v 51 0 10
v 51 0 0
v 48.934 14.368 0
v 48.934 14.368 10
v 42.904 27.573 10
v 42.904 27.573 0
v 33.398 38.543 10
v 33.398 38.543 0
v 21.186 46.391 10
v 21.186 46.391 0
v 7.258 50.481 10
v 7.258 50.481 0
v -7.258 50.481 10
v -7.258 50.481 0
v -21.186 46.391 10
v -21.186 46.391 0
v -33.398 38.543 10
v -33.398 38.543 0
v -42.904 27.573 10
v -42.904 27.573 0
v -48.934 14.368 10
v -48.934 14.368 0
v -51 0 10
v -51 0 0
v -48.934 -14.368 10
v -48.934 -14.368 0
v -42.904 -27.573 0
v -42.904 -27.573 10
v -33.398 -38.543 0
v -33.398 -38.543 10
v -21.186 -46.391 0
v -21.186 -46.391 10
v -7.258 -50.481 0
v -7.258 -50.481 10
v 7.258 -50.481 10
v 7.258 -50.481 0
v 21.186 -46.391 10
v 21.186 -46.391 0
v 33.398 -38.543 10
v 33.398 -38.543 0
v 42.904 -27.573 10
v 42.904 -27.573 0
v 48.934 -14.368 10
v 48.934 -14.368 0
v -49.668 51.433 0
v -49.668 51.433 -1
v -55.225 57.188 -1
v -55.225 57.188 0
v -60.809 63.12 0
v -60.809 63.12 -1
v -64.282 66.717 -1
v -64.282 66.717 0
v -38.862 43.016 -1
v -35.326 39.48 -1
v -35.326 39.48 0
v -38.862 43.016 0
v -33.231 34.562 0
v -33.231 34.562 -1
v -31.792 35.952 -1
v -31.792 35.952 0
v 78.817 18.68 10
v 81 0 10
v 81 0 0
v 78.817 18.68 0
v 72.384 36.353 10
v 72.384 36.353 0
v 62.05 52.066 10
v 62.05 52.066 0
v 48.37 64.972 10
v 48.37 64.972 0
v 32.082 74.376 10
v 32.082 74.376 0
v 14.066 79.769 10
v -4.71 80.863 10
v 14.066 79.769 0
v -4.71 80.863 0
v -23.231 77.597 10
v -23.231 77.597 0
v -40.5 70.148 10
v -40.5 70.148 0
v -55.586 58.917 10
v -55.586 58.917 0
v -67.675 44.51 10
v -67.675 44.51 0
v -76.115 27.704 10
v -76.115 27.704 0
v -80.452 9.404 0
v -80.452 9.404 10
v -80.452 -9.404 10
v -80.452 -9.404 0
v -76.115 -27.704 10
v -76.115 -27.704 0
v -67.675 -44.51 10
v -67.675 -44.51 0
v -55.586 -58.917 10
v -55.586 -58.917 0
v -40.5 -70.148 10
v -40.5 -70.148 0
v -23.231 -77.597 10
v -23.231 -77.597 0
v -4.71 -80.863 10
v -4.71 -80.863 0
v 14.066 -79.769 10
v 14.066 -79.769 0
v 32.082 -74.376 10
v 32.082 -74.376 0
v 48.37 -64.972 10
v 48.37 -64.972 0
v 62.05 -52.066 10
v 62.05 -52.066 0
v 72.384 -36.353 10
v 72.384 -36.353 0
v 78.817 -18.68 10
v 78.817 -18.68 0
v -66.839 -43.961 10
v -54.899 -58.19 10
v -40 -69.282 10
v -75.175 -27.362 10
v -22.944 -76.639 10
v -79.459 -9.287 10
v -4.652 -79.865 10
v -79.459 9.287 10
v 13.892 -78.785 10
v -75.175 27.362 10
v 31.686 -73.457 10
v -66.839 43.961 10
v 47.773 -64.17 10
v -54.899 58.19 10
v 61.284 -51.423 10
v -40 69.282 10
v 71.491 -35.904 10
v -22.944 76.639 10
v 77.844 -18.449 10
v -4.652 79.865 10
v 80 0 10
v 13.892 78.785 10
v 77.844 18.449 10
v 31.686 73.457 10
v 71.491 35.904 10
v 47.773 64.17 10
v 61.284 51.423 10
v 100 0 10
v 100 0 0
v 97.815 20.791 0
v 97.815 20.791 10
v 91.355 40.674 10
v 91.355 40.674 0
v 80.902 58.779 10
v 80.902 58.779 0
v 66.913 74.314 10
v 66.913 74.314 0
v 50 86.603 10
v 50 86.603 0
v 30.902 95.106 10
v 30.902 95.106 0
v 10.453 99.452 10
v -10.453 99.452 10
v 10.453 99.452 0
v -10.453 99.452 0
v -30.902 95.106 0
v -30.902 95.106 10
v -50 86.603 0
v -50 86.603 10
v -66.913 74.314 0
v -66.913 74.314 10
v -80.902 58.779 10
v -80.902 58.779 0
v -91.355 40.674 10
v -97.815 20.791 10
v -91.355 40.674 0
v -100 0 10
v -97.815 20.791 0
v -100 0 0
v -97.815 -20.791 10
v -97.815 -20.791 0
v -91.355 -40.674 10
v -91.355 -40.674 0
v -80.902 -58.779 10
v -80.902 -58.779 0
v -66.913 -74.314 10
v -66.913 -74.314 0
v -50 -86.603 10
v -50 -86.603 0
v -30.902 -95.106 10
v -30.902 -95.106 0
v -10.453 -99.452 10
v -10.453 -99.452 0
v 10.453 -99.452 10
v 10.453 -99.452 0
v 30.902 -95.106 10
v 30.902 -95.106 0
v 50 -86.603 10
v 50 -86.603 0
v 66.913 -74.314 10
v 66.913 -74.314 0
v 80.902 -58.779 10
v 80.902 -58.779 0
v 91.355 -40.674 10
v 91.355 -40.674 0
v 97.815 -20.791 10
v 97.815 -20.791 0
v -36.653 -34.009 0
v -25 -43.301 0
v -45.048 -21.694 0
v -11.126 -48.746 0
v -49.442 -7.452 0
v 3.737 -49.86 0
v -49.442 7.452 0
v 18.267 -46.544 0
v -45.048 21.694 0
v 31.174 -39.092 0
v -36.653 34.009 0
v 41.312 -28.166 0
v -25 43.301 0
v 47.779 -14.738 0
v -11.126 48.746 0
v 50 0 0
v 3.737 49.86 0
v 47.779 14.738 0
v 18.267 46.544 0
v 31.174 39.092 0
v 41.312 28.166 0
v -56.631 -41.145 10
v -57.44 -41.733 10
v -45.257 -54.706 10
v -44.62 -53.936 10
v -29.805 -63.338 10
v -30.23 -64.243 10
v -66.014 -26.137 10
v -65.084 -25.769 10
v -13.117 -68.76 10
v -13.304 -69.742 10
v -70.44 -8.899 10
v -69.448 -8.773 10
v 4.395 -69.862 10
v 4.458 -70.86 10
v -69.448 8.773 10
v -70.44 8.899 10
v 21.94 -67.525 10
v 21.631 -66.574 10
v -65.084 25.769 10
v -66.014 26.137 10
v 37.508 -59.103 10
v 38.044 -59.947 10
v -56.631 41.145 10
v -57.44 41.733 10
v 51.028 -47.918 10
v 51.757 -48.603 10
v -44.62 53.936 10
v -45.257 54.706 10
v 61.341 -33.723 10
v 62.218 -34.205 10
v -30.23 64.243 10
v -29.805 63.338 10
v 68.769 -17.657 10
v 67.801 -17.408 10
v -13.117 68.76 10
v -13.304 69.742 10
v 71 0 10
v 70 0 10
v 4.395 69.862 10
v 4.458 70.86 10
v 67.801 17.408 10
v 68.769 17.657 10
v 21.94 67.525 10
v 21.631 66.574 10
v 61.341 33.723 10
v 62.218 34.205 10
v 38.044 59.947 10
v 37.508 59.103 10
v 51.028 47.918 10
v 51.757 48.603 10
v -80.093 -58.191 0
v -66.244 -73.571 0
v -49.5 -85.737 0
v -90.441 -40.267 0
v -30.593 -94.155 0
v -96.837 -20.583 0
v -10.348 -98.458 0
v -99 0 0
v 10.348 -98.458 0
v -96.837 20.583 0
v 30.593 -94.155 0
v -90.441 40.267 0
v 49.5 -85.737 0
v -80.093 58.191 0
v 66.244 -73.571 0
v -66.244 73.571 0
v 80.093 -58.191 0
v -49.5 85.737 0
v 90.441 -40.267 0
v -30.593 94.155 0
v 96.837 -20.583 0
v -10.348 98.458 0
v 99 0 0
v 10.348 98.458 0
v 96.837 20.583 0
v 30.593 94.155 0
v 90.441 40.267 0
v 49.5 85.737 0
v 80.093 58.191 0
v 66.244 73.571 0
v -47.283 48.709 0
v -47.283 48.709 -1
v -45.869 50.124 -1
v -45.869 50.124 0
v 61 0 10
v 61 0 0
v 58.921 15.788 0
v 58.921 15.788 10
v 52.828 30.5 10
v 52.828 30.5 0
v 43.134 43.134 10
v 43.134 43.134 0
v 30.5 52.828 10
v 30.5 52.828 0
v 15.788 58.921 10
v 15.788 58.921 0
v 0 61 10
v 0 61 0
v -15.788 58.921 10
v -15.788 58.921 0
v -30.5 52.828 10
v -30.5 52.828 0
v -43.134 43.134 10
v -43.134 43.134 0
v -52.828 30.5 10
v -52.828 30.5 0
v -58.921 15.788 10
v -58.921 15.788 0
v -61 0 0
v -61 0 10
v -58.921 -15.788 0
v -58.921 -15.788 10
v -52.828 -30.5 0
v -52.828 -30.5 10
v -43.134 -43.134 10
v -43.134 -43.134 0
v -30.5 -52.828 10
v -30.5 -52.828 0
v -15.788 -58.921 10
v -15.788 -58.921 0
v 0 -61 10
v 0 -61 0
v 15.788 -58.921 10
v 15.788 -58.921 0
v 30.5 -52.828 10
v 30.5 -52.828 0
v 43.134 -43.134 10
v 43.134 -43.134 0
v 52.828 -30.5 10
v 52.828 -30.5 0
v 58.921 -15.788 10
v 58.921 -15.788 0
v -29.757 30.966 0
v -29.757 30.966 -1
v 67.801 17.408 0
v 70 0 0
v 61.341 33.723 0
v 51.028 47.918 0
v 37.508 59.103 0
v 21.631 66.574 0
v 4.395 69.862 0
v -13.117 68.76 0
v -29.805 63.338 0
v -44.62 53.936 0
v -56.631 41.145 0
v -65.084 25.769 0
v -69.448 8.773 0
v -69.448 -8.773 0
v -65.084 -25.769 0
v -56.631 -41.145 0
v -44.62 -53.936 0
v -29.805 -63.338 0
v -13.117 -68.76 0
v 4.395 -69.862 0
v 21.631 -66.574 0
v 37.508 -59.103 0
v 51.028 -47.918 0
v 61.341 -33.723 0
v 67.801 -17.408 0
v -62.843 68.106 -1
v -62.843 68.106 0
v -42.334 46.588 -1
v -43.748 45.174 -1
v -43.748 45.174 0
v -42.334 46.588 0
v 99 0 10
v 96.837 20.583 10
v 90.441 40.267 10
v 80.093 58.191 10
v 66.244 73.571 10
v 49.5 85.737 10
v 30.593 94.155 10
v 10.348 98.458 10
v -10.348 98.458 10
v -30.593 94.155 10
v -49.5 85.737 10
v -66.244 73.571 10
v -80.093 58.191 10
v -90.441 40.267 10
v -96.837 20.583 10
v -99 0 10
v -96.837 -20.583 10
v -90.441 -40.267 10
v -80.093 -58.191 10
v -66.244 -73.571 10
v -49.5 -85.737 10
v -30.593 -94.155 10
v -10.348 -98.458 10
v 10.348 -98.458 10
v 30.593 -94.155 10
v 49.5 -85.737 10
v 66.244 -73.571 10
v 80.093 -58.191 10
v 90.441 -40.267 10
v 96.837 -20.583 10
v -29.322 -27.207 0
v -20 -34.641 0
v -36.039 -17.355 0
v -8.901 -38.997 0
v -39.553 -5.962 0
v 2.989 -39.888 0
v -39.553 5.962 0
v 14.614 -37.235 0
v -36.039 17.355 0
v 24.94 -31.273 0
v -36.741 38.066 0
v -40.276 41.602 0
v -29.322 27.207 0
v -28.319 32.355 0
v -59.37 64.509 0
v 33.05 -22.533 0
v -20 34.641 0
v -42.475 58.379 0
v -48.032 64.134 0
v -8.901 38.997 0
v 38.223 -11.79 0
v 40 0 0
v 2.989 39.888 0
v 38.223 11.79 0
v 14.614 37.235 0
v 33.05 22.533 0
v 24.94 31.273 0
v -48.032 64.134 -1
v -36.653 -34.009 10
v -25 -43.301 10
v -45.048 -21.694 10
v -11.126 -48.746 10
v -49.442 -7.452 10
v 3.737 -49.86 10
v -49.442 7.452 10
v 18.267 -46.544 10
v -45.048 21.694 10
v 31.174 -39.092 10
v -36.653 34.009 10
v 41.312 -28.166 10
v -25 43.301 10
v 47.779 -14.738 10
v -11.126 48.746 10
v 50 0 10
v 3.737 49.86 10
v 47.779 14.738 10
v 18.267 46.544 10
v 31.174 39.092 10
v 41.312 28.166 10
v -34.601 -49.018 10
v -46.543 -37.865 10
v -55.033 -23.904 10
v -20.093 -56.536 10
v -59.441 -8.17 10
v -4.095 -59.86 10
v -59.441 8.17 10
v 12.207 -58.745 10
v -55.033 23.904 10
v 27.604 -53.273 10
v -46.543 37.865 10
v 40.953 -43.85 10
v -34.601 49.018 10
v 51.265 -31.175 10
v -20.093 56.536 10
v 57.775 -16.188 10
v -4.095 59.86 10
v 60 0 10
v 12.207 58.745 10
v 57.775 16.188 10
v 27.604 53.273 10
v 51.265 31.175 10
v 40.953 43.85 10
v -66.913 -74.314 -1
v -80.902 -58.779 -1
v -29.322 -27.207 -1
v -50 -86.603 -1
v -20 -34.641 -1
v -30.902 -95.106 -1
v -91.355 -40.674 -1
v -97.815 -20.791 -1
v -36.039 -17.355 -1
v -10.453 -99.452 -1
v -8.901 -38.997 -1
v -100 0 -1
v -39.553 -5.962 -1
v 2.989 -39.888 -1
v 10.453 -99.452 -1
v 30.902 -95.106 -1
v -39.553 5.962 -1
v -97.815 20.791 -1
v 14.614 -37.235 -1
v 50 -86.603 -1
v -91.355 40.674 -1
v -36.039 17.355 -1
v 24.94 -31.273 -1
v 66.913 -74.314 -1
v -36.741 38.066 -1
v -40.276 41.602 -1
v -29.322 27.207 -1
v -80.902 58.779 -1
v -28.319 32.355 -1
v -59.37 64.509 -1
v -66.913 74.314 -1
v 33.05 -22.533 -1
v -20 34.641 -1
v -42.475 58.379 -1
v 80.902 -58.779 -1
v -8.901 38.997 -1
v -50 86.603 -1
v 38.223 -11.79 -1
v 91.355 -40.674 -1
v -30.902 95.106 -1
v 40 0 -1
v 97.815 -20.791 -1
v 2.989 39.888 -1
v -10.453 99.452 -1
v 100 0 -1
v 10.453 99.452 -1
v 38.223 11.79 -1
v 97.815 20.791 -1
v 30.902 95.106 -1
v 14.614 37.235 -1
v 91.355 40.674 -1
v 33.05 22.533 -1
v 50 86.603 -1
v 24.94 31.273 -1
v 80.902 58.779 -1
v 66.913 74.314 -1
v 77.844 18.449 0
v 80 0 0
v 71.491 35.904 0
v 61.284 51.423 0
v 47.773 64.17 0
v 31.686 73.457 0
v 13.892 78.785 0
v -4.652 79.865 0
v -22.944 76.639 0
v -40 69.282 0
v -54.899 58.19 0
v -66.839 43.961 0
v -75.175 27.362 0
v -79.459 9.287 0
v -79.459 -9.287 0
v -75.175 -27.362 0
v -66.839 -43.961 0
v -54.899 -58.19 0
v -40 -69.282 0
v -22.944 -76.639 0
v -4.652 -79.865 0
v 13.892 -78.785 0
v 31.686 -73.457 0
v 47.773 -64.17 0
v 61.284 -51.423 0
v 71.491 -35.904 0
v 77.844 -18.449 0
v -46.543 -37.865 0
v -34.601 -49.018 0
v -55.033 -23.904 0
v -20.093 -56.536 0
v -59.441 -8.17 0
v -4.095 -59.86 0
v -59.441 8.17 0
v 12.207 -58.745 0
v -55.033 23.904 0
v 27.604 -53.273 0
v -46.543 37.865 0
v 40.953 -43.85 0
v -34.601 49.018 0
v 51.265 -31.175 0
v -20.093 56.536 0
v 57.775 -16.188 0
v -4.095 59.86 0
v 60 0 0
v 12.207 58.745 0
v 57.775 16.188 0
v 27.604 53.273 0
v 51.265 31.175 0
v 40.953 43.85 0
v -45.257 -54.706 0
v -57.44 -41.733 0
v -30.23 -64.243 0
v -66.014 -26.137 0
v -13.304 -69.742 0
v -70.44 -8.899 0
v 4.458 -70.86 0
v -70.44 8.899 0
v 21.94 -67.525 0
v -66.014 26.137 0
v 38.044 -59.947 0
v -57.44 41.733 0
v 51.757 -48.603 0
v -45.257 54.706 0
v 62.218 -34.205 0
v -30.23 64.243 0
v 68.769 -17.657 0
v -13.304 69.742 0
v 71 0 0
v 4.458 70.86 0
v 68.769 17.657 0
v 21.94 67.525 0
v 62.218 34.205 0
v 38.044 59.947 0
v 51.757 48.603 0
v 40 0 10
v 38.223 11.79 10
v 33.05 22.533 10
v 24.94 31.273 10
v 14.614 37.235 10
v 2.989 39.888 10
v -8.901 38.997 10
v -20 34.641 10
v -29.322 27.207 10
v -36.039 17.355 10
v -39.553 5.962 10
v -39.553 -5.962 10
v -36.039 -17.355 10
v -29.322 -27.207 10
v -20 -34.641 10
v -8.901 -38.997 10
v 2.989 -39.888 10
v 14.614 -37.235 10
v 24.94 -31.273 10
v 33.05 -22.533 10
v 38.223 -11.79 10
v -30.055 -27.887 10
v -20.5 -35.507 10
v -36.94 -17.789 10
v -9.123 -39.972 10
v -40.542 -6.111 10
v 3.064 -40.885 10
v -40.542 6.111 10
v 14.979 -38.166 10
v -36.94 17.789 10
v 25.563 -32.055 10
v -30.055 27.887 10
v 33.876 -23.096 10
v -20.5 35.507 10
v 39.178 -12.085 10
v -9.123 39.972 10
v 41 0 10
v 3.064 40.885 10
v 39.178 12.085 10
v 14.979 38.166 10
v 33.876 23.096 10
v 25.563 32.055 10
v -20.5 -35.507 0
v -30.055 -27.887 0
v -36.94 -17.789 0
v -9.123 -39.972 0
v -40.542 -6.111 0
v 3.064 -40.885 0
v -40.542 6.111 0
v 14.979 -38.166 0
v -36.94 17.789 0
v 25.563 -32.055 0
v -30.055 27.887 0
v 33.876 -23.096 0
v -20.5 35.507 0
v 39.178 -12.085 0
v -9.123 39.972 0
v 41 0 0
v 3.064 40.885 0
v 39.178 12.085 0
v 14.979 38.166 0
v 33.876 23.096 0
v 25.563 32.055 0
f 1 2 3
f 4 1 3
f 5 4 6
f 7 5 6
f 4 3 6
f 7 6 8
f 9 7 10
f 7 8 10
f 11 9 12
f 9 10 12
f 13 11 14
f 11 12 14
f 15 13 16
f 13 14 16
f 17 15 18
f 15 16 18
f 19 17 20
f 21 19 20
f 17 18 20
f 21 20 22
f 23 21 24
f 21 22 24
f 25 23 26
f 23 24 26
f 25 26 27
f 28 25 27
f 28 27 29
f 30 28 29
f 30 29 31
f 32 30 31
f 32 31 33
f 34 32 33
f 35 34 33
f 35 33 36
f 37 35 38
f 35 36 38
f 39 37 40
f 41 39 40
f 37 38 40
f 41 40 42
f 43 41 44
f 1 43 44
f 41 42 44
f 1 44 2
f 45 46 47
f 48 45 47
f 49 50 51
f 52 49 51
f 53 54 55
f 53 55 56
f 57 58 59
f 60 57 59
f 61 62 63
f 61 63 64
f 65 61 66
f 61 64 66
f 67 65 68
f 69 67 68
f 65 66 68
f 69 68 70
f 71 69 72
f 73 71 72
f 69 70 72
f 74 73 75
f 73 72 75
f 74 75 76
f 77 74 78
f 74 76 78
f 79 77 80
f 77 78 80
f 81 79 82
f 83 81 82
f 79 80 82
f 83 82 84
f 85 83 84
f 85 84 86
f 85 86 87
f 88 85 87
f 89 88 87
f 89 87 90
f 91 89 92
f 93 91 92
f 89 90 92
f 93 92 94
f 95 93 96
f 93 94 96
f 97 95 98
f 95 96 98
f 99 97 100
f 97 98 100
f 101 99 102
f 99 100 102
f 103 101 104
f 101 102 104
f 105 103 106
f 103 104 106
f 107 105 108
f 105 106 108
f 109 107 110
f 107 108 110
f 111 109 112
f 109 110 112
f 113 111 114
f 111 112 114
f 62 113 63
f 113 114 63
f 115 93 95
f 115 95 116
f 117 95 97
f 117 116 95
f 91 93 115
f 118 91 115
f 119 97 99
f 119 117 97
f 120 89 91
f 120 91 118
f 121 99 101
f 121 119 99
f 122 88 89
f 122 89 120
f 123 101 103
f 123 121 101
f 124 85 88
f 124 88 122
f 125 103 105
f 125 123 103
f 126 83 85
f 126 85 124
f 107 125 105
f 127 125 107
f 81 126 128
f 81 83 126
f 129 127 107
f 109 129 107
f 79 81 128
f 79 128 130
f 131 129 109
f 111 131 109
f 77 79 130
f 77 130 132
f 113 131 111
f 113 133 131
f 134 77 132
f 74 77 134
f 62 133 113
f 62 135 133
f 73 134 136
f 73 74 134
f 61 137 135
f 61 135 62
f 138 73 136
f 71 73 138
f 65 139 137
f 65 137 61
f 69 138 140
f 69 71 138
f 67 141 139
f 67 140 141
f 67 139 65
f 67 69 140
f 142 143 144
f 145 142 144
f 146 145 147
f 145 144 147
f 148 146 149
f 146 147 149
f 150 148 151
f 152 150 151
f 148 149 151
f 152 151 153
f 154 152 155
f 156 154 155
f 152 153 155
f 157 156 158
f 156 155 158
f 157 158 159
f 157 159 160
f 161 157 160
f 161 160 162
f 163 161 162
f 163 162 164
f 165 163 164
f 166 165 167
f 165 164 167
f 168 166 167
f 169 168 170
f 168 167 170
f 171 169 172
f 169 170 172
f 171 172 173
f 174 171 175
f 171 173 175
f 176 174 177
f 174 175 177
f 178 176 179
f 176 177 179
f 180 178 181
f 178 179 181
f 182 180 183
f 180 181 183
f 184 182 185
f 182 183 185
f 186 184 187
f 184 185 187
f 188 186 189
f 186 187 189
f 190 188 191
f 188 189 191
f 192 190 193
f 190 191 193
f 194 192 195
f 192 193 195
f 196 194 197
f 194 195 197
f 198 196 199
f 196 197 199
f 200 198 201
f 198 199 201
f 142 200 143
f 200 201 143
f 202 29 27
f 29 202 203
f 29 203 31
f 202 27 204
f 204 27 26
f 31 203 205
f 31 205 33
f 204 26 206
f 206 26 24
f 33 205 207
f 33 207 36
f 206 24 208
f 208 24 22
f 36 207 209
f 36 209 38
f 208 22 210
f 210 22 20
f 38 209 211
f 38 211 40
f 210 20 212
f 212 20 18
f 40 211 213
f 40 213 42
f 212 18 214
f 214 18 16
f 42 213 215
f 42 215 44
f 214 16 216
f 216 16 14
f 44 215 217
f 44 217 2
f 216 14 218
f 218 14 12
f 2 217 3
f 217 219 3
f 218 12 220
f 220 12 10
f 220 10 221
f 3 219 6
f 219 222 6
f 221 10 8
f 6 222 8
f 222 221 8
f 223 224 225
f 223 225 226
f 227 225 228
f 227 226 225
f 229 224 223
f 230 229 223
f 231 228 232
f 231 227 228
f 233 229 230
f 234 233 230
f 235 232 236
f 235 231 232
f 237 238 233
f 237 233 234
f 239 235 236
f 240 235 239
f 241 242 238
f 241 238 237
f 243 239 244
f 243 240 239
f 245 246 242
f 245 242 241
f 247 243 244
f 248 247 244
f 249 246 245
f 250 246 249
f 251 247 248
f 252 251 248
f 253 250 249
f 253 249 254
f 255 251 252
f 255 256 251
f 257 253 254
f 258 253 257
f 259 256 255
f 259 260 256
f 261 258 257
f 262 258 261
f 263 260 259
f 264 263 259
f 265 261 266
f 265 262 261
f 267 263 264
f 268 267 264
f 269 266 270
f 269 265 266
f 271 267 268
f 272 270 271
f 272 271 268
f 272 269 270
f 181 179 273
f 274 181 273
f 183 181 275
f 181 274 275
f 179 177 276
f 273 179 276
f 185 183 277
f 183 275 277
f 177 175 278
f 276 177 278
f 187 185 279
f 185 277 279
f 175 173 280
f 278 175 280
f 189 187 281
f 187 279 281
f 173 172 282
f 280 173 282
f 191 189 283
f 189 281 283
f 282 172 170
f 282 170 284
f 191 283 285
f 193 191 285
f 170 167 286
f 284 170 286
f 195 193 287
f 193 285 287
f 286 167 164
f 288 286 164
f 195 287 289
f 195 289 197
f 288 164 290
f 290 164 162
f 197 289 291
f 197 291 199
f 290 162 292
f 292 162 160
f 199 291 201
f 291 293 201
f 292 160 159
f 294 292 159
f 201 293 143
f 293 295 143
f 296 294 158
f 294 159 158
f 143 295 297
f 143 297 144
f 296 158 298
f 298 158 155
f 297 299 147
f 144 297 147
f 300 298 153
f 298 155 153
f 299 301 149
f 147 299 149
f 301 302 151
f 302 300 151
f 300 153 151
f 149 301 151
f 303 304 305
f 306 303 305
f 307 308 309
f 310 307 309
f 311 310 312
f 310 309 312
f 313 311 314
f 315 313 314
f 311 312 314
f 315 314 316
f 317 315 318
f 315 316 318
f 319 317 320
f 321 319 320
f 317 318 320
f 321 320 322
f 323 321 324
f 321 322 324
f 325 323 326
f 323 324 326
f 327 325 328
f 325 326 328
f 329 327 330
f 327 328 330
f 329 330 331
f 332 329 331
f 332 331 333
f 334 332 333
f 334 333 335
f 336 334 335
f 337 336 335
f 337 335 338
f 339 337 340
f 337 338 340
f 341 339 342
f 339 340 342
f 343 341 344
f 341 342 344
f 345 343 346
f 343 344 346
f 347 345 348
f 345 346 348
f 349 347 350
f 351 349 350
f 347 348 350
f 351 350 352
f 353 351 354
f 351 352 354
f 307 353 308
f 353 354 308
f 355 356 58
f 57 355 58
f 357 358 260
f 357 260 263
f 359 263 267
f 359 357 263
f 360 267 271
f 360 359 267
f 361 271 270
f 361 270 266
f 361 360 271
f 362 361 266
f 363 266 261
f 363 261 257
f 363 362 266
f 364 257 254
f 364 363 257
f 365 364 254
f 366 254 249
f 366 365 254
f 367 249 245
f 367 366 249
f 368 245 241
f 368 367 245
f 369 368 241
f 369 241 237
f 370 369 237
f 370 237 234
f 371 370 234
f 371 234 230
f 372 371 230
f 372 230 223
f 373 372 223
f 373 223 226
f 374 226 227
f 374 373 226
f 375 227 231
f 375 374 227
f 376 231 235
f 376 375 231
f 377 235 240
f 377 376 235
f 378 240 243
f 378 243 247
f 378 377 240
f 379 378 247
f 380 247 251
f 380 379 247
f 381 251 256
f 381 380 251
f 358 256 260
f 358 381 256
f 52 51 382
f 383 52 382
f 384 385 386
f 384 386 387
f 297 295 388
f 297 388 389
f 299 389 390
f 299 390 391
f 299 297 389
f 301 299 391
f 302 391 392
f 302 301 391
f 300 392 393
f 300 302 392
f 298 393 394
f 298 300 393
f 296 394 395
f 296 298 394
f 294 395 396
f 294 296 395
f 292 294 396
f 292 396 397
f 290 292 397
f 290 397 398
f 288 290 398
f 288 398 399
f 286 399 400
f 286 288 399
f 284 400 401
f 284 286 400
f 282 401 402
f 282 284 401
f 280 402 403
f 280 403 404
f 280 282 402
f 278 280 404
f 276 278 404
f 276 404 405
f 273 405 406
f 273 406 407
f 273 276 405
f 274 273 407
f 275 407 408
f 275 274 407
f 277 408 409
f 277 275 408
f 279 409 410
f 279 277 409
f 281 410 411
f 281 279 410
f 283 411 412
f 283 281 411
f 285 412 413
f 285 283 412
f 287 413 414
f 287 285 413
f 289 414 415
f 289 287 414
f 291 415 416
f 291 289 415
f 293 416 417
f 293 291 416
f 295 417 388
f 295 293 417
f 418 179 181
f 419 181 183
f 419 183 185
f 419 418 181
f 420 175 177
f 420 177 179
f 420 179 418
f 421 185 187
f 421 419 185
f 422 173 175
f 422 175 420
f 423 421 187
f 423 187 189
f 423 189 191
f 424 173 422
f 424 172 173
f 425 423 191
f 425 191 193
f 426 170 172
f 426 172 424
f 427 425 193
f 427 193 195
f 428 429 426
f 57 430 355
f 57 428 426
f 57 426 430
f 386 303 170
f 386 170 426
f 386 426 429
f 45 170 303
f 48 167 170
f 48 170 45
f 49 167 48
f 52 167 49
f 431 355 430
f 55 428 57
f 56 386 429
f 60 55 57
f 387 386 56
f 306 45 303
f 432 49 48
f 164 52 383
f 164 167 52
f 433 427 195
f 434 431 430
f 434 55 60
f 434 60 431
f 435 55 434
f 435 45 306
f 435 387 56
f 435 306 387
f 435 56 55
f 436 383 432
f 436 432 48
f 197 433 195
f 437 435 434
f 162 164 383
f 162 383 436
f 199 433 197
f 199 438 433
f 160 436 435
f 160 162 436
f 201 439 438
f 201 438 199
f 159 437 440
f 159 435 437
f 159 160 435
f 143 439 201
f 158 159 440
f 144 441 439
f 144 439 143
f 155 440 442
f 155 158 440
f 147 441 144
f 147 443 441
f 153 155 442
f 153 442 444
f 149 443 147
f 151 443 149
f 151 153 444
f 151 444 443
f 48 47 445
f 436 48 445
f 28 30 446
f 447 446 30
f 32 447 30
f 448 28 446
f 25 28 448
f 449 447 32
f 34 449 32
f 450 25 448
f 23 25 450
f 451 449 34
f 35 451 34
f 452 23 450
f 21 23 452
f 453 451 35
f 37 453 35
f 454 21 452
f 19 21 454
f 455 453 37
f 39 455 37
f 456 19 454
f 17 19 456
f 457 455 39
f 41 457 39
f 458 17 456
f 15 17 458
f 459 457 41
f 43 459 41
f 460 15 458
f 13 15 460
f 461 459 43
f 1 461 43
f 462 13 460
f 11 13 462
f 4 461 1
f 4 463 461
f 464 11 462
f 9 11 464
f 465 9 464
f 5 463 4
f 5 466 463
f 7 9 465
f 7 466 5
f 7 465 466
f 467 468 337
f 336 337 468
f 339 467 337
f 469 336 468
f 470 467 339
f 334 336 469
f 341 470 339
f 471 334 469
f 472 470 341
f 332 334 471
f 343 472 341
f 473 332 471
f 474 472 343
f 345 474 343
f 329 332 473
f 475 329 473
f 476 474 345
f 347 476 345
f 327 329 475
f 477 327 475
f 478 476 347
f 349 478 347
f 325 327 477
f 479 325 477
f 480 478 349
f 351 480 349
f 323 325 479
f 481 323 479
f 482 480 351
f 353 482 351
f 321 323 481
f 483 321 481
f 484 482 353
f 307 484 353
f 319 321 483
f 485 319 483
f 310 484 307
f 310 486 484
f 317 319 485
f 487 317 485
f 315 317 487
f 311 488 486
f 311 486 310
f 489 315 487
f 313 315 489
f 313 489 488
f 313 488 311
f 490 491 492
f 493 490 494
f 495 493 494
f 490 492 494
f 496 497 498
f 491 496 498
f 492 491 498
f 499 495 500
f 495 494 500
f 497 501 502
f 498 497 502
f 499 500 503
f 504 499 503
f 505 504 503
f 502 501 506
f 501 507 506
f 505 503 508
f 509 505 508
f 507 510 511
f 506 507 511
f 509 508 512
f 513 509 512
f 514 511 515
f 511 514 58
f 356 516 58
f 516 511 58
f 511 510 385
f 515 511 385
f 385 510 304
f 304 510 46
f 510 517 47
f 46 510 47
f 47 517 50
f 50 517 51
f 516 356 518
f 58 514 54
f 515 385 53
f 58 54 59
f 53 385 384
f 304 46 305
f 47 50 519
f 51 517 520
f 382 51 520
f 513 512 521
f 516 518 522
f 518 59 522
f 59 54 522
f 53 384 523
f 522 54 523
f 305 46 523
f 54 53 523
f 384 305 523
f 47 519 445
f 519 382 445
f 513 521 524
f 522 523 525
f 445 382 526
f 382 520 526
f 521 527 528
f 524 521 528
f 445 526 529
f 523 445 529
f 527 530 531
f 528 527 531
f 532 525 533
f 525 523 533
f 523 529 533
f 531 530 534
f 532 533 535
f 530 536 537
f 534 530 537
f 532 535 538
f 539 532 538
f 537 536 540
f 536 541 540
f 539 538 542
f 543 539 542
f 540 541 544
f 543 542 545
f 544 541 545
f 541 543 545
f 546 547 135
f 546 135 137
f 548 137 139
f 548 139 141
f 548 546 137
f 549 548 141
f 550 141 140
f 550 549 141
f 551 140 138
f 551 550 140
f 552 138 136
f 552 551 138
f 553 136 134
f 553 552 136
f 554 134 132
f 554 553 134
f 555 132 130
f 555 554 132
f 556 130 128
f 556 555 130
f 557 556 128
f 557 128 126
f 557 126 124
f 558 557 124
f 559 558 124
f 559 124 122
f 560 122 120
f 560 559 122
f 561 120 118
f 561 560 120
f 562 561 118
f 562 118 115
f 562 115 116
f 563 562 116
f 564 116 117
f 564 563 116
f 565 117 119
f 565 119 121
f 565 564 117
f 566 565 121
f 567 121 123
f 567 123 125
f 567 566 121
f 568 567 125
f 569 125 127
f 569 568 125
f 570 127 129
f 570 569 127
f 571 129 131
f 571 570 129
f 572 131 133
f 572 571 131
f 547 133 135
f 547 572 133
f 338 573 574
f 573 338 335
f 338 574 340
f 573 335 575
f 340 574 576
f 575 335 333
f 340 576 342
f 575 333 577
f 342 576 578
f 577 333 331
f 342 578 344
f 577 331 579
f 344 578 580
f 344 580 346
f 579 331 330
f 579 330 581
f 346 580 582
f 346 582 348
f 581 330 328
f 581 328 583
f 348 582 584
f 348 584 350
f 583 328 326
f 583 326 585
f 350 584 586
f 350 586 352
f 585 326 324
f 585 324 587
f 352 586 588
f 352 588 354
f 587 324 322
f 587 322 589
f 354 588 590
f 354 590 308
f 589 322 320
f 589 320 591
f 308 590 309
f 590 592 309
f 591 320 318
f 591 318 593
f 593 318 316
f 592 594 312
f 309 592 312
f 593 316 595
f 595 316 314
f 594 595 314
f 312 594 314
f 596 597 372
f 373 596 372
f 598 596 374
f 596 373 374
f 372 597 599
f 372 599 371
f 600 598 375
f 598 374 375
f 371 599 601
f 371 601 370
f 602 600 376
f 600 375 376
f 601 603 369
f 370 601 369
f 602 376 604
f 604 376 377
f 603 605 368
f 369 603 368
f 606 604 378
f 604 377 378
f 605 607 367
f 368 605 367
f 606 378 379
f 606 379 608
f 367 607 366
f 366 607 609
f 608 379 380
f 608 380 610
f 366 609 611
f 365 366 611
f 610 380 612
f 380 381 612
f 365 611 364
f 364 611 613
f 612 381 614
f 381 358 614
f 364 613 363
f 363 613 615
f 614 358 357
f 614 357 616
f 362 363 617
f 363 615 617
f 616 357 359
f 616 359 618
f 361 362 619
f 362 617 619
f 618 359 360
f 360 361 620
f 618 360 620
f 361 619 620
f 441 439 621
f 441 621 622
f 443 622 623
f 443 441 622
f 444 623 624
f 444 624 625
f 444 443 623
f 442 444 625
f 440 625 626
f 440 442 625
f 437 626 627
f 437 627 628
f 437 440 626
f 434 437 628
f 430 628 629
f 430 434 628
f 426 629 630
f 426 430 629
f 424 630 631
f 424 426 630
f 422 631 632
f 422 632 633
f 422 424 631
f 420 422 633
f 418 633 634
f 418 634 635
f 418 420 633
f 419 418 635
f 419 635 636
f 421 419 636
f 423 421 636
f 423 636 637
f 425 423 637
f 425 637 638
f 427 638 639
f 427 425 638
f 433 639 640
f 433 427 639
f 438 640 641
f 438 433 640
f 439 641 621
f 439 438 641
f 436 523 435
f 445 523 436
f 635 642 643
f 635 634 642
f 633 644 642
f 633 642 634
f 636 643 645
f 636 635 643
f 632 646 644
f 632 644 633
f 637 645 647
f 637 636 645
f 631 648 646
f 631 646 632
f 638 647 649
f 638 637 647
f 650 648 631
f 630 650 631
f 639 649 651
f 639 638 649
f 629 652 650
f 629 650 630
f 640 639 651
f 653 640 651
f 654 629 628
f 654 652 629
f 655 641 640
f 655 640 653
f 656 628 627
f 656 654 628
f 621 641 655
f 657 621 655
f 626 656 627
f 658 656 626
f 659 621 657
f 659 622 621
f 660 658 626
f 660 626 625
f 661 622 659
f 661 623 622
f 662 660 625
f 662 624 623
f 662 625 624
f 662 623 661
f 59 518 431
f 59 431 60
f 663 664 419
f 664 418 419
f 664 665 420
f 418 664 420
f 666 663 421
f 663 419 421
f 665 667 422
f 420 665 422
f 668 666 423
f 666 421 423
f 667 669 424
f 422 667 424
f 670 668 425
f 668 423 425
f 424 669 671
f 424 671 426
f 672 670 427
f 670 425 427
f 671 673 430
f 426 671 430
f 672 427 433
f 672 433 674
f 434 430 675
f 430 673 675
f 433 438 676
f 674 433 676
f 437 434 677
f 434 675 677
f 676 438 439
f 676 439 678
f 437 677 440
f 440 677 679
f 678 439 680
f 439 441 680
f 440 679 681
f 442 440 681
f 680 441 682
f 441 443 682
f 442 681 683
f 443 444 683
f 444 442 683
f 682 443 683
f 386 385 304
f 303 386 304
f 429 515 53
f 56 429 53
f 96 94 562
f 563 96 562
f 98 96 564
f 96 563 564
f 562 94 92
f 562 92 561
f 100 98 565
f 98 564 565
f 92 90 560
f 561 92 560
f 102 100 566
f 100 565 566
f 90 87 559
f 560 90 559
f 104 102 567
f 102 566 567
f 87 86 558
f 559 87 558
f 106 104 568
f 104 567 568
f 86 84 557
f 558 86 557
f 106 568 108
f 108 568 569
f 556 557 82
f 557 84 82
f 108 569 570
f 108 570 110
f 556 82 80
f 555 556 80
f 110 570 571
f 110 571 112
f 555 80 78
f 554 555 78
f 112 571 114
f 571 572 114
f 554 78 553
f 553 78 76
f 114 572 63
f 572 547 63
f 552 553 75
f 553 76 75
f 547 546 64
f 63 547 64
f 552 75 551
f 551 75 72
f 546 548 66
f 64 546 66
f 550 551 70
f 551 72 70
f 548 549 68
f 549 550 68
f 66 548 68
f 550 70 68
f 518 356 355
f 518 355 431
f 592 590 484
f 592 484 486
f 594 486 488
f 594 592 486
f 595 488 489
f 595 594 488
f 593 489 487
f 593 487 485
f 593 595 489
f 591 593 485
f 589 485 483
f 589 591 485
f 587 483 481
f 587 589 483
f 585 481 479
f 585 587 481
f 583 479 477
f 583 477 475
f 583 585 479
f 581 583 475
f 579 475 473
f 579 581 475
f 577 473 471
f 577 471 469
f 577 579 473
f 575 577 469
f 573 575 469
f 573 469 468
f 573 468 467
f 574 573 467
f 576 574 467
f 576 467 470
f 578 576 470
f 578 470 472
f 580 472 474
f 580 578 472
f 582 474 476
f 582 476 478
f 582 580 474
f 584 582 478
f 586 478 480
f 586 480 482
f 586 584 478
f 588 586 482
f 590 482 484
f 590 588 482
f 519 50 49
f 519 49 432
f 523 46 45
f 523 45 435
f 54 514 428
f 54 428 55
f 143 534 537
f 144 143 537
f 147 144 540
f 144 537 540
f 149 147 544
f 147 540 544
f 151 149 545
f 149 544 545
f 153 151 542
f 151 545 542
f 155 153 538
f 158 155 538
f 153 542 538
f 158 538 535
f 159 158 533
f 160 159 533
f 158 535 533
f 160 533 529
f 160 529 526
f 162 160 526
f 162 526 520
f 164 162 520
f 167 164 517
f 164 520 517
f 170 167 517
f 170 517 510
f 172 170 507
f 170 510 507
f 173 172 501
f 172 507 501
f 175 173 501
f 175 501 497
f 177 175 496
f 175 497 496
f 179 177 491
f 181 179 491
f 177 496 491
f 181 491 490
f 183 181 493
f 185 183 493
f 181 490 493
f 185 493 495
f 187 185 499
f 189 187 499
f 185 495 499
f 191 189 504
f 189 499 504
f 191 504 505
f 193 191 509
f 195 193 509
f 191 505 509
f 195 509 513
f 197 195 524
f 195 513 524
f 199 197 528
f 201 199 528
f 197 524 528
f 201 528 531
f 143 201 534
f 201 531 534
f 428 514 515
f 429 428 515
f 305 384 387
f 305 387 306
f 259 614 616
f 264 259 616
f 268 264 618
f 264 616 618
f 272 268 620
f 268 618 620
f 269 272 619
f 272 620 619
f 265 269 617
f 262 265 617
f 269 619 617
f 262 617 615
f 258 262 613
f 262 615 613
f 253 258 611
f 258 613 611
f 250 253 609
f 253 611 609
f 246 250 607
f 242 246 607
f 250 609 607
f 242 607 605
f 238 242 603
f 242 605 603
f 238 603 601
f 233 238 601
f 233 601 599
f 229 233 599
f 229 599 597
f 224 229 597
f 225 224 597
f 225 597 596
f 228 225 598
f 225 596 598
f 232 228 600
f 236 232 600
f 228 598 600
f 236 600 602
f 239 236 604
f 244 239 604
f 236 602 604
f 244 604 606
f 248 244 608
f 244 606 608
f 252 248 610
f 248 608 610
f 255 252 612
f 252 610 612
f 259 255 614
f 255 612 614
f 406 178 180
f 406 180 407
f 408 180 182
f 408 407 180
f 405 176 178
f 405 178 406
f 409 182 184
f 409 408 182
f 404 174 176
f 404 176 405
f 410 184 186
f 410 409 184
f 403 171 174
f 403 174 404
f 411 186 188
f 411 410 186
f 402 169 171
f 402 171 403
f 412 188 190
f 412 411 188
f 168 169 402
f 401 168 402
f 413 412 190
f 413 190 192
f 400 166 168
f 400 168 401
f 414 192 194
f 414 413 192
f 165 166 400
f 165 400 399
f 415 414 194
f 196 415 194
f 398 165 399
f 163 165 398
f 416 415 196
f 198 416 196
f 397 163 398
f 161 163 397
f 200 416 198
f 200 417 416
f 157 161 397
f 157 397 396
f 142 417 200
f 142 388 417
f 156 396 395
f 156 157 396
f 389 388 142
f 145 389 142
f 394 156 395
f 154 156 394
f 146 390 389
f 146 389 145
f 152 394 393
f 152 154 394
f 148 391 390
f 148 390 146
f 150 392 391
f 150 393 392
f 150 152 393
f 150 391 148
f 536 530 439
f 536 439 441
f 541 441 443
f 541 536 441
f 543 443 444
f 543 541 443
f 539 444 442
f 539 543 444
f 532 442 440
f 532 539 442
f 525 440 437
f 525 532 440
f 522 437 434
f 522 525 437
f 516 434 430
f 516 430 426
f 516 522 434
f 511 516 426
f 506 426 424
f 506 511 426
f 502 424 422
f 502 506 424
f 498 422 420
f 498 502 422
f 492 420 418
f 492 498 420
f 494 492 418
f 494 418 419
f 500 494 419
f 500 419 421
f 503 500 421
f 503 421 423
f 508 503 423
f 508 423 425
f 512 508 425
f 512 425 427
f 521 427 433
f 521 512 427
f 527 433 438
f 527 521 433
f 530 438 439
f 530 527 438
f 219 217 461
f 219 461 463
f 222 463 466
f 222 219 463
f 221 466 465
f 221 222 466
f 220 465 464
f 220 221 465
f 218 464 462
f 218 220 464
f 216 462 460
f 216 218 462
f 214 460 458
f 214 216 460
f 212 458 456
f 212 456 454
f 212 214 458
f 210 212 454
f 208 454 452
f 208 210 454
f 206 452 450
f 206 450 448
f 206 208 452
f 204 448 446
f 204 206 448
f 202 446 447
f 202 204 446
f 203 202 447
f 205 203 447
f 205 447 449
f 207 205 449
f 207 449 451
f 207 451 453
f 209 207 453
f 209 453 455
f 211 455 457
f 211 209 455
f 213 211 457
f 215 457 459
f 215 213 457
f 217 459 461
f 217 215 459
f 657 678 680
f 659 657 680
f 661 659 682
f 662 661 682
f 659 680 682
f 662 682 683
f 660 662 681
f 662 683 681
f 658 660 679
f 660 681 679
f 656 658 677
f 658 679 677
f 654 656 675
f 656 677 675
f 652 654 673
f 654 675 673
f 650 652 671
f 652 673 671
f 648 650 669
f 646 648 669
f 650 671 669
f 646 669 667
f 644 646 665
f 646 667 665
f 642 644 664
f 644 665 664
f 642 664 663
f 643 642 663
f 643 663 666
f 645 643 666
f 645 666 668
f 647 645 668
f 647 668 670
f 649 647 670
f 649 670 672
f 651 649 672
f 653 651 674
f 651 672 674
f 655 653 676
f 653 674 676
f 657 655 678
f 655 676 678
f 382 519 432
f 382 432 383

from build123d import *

# Parameters (mm, degrees)
CYLINDER001_R          = 99
CYLINDER001_DEPTH      = 10
CYLINDER_R             = 100
CYLINDER_DEPTH         = 10
CYLINDER002_R          = 80
CYLINDER002_DEPTH      = 10
CYLINDER003_R          = 81
CYLINDER003_DEPTH      = 10
CYLINDER007_R          = 70
CYLINDER007_DEPTH      = 10
CYLINDER006_R          = 71
CYLINDER006_DEPTH      = 10
CYLINDER008_R          = 60
CYLINDER008_DEPTH      = 10
CYLINDER009_R          = 61
CYLINDER009_DEPTH      = 10
CYLINDER010_R          = 50
CYLINDER010_DEPTH      = 10
CYLINDER011_R          = 51
CYLINDER011_DEPTH      = 10
CYLINDER012_R          = 40
CYLINDER012_DEPTH      = 10
CYLINDER013_R          = 41
CYLINDER013_DEPTH      = 10
CYLINDER014_R          = 40
CYLINDER014_DEPTH      = 10
CYLINDER005_R          = 70
CYLINDER005_DEPTH      = 10
CYLINDER004_R          = 81
CYLINDER004_DEPTH      = 10
BOX012_W               = 2
BOX012_H               = 5
BOX012_DEPTH           = 1
BOX012_PLACEMENT_ANGLE = 44
BOX011_W               = 2
BOX011_H               = 5
BOX011_DEPTH           = 1
BOX011_PLACEMENT_ANGLE = 44
BOX010_W               = 2
BOX010_H               = 5
BOX010_DEPTH           = 1
BOX010_PLACEMENT_ANGLE = 315
BOX009_W               = 2
BOX009_H               = 5
BOX009_DEPTH           = 1
BOX009_PLACEMENT_ANGLE = 45
BOX008_W               = 10
BOX008_H               = 8
BOX008_DEPTH           = 1
BOX008_PLACEMENT_ANGLE = 44
CYLINDER016_R          = 40
CYLINDER016_DEPTH      = 1
CYLINDER015_R          = 100
CYLINDER015_DEPTH      = 1


with BuildPart() as cilindro001:
    # Cylinder001 → Cylinder001 (new body)
    with BuildSketch(Plane.XY):
        Circle(CYLINDER001_R)
    extrude(amount=CYLINDER001_DEPTH)


with BuildPart() as cut:
    # Cylinder → Cylinder (new body)
    with BuildSketch(Plane.XY):
        Circle(CYLINDER_R)
    extrude(amount=CYLINDER_DEPTH)

    # Cut: cut Cilindro001
    add(cilindro001.part, mode=Mode.SUBTRACT)


with BuildPart() as cilindro002:
    # Cylinder002 → Cylinder002 (new body)
    with BuildSketch(Plane.XY):
        Circle(CYLINDER002_R)
    extrude(amount=CYLINDER002_DEPTH)


with BuildPart() as cut001:
    # Cylinder003 → Cylinder003 (new body)
    with BuildSketch(Plane.XY):
        Circle(CYLINDER003_R)
    extrude(amount=CYLINDER003_DEPTH)

    # Cut001: cut Cilindro002
    add(cilindro002.part, mode=Mode.SUBTRACT)


with BuildPart() as cilindro007:
    # Cylinder007 → Cylinder007 (new body)
    with BuildSketch(Plane.XY):
        Circle(CYLINDER007_R)
    extrude(amount=CYLINDER007_DEPTH)


with BuildPart() as cut004:
    # Cylinder006 → Cylinder006 (new body)
    with BuildSketch(Plane.XY):
        Circle(CYLINDER006_R)
    extrude(amount=CYLINDER006_DEPTH)

    # Cut004: cut Cilindro007
    add(cilindro007.part, mode=Mode.SUBTRACT)


with BuildPart() as cilindro008:
    # Cylinder008 → Cylinder008 (new body)
    with BuildSketch(Plane.XY):
        Circle(CYLINDER008_R)
    extrude(amount=CYLINDER008_DEPTH)


with BuildPart() as cut005:
    # Cylinder009 → Cylinder009 (new body)
    with BuildSketch(Plane.XY):
        Circle(CYLINDER009_R)
    extrude(amount=CYLINDER009_DEPTH)

    # Cut005: cut Cilindro008
    add(cilindro008.part, mode=Mode.SUBTRACT)


with BuildPart() as cilindro010:
    # Cylinder010 → Cylinder010 (new body)
    with BuildSketch(Plane.XY):
        Circle(CYLINDER010_R)
    extrude(amount=CYLINDER010_DEPTH)


with BuildPart() as cut006:
    # Cylinder011 → Cylinder011 (new body)
    with BuildSketch(Plane.XY):
        Circle(CYLINDER011_R)
    extrude(amount=CYLINDER011_DEPTH)

    # Cut006: cut Cilindro010
    add(cilindro010.part, mode=Mode.SUBTRACT)


with BuildPart() as cilindro012:
    # Cylinder012 → Cylinder012 (new body)
    with BuildSketch(Plane.XY):
        Circle(CYLINDER012_R)
    extrude(amount=CYLINDER012_DEPTH)


with BuildPart() as cut007:
    # Cylinder013 → Cylinder013 (new body)
    with BuildSketch(Plane.XY):
        Circle(CYLINDER013_R)
    extrude(amount=CYLINDER013_DEPTH)

    # Cut007: cut Cilindro012
    add(cilindro012.part, mode=Mode.SUBTRACT)


with BuildPart() as cilindro014:
    # Cylinder014 → Cylinder014 (new body)
    with BuildSketch(Plane.XY):
        Circle(CYLINDER014_R)
    extrude(amount=CYLINDER014_DEPTH)


with BuildPart() as cilindro005:
    # Cylinder005 → Cylinder005 (new body)
    with BuildSketch(Plane.XY):
        Circle(CYLINDER005_R)
    extrude(amount=CYLINDER005_DEPTH)


with BuildPart() as cut002:
    # Cylinder004 → Cylinder004 (new body)
    with BuildSketch(Plane.XY):
        Circle(CYLINDER004_R)
    extrude(amount=CYLINDER004_DEPTH)

    # Cut002: cut Cilindro005
    add(cilindro005.part, mode=Mode.SUBTRACT)


with BuildPart() as cubo012:
    # Box012 → Box012 (new body)
    with BuildSketch(Plane.XY):
        with Locations((1, 2.5)):
            Rectangle(BOX012_W, BOX012_H)
    extrude(amount=BOX012_DEPTH)


with BuildPart() as cubo012_1:
    # Box012 placement: moved
    add(cubo012.part.moved(Location((-60.808516, 63.120144, -1))).rotate(Axis((-60.808516, 63.120144, -1), (0, 0, 1)), BOX012_PLACEMENT_ANGLE))


with BuildPart() as cubo011:
    # Box011 → Box011 (new body)
    with BuildSketch(Plane.XY):
        with Locations((1, 2.5)):
            Rectangle(BOX011_W, BOX011_H)
    extrude(amount=BOX011_DEPTH)


with BuildPart() as cubo011_1:
    # Box011 placement: moved
    add(cubo011.part.moved(Location((-29.757287, 30.965655, -1))).rotate(Axis((-29.757287, 30.965655, -1), (0, 0, 1)), BOX011_PLACEMENT_ANGLE))


with BuildPart() as cubo010:
    # Box010 → Box010 (new body)
    with BuildSketch(Plane.XY):
        with Locations((1, 2.5)):
            Rectangle(BOX010_W, BOX010_H)
    extrude(amount=BOX010_DEPTH)


with BuildPart() as cubo010_1:
    # Box010 placement: moved
    add(cubo010.part.moved(Location((-36.740688, 38.066102, -1))).rotate(Axis((-36.740688, 38.066102, -1), (0, 0, -1)), BOX010_PLACEMENT_ANGLE))


with BuildPart() as cubo009:
    # Box009 → Box009 (new body)
    with BuildSketch(Plane.XY):
        with Locations((1, 2.5)):
            Rectangle(BOX009_W, BOX009_H)
    extrude(amount=BOX009_DEPTH)


with BuildPart() as cubo009_1:
    # Box009 placement: moved
    add(cubo009.part.moved(Location((-43.747961, 45.173784, -1))).rotate(Axis((-43.747961, 45.173784, -1), (0, 0, 1)), BOX009_PLACEMENT_ANGLE))


with BuildPart() as cubo008:
    # Box008 → Box008 (new body)
    with BuildSketch(Plane.XY):
        with Locations((5, 4)):
            Rectangle(BOX008_W, BOX008_H)
    extrude(amount=BOX008_DEPTH)


with BuildPart() as cubo008_1:
    # Box008 placement: moved
    add(cubo008.part.moved(Location((-49.668024, 51.4328, -1))).rotate(Axis((-49.668024, 51.4328, -1), (0, 0, 1)), BOX008_PLACEMENT_ANGLE))


with BuildPart() as cilindro016:
    # Cylinder016 → Cylinder016 (new body)
    with BuildSketch(Plane.XY.offset(-1)):
        Circle(CYLINDER016_R)
    extrude(amount=CYLINDER016_DEPTH)


with BuildPart() as cut016:
    # Cylinder015 → Cylinder015 (new body)
    with BuildSketch(Plane.XY.offset(-1)):
        Circle(CYLINDER015_R)
    extrude(amount=CYLINDER015_DEPTH)

    # Cut009: cut Cilindro016
    add(cilindro016.part, mode=Mode.SUBTRACT)

    # Cut010: cut Cubo008
    add(cubo008_1.part, mode=Mode.SUBTRACT)

    # Cut011: cut Cubo009
    add(cubo009_1.part, mode=Mode.SUBTRACT)

    # Cut012: cut Cubo010
    add(cubo010_1.part, mode=Mode.SUBTRACT)

    # Cut013: cut Cubo011
    add(cubo011_1.part, mode=Mode.SUBTRACT)

    # Cut014: cut Cubo012
    add(cubo012_1.part, mode=Mode.SUBTRACT)

    # Cut015: cut Cut002
    add(cut002.part, mode=Mode.SUBTRACT)

    # Cut016: cut Cilindro014
    add(cilindro014.part, mode=Mode.SUBTRACT)


solid = Compound([cut.part, cut001.part, cut004.part, cut005.part, cut006.part, cut007.part, cut016.part])
